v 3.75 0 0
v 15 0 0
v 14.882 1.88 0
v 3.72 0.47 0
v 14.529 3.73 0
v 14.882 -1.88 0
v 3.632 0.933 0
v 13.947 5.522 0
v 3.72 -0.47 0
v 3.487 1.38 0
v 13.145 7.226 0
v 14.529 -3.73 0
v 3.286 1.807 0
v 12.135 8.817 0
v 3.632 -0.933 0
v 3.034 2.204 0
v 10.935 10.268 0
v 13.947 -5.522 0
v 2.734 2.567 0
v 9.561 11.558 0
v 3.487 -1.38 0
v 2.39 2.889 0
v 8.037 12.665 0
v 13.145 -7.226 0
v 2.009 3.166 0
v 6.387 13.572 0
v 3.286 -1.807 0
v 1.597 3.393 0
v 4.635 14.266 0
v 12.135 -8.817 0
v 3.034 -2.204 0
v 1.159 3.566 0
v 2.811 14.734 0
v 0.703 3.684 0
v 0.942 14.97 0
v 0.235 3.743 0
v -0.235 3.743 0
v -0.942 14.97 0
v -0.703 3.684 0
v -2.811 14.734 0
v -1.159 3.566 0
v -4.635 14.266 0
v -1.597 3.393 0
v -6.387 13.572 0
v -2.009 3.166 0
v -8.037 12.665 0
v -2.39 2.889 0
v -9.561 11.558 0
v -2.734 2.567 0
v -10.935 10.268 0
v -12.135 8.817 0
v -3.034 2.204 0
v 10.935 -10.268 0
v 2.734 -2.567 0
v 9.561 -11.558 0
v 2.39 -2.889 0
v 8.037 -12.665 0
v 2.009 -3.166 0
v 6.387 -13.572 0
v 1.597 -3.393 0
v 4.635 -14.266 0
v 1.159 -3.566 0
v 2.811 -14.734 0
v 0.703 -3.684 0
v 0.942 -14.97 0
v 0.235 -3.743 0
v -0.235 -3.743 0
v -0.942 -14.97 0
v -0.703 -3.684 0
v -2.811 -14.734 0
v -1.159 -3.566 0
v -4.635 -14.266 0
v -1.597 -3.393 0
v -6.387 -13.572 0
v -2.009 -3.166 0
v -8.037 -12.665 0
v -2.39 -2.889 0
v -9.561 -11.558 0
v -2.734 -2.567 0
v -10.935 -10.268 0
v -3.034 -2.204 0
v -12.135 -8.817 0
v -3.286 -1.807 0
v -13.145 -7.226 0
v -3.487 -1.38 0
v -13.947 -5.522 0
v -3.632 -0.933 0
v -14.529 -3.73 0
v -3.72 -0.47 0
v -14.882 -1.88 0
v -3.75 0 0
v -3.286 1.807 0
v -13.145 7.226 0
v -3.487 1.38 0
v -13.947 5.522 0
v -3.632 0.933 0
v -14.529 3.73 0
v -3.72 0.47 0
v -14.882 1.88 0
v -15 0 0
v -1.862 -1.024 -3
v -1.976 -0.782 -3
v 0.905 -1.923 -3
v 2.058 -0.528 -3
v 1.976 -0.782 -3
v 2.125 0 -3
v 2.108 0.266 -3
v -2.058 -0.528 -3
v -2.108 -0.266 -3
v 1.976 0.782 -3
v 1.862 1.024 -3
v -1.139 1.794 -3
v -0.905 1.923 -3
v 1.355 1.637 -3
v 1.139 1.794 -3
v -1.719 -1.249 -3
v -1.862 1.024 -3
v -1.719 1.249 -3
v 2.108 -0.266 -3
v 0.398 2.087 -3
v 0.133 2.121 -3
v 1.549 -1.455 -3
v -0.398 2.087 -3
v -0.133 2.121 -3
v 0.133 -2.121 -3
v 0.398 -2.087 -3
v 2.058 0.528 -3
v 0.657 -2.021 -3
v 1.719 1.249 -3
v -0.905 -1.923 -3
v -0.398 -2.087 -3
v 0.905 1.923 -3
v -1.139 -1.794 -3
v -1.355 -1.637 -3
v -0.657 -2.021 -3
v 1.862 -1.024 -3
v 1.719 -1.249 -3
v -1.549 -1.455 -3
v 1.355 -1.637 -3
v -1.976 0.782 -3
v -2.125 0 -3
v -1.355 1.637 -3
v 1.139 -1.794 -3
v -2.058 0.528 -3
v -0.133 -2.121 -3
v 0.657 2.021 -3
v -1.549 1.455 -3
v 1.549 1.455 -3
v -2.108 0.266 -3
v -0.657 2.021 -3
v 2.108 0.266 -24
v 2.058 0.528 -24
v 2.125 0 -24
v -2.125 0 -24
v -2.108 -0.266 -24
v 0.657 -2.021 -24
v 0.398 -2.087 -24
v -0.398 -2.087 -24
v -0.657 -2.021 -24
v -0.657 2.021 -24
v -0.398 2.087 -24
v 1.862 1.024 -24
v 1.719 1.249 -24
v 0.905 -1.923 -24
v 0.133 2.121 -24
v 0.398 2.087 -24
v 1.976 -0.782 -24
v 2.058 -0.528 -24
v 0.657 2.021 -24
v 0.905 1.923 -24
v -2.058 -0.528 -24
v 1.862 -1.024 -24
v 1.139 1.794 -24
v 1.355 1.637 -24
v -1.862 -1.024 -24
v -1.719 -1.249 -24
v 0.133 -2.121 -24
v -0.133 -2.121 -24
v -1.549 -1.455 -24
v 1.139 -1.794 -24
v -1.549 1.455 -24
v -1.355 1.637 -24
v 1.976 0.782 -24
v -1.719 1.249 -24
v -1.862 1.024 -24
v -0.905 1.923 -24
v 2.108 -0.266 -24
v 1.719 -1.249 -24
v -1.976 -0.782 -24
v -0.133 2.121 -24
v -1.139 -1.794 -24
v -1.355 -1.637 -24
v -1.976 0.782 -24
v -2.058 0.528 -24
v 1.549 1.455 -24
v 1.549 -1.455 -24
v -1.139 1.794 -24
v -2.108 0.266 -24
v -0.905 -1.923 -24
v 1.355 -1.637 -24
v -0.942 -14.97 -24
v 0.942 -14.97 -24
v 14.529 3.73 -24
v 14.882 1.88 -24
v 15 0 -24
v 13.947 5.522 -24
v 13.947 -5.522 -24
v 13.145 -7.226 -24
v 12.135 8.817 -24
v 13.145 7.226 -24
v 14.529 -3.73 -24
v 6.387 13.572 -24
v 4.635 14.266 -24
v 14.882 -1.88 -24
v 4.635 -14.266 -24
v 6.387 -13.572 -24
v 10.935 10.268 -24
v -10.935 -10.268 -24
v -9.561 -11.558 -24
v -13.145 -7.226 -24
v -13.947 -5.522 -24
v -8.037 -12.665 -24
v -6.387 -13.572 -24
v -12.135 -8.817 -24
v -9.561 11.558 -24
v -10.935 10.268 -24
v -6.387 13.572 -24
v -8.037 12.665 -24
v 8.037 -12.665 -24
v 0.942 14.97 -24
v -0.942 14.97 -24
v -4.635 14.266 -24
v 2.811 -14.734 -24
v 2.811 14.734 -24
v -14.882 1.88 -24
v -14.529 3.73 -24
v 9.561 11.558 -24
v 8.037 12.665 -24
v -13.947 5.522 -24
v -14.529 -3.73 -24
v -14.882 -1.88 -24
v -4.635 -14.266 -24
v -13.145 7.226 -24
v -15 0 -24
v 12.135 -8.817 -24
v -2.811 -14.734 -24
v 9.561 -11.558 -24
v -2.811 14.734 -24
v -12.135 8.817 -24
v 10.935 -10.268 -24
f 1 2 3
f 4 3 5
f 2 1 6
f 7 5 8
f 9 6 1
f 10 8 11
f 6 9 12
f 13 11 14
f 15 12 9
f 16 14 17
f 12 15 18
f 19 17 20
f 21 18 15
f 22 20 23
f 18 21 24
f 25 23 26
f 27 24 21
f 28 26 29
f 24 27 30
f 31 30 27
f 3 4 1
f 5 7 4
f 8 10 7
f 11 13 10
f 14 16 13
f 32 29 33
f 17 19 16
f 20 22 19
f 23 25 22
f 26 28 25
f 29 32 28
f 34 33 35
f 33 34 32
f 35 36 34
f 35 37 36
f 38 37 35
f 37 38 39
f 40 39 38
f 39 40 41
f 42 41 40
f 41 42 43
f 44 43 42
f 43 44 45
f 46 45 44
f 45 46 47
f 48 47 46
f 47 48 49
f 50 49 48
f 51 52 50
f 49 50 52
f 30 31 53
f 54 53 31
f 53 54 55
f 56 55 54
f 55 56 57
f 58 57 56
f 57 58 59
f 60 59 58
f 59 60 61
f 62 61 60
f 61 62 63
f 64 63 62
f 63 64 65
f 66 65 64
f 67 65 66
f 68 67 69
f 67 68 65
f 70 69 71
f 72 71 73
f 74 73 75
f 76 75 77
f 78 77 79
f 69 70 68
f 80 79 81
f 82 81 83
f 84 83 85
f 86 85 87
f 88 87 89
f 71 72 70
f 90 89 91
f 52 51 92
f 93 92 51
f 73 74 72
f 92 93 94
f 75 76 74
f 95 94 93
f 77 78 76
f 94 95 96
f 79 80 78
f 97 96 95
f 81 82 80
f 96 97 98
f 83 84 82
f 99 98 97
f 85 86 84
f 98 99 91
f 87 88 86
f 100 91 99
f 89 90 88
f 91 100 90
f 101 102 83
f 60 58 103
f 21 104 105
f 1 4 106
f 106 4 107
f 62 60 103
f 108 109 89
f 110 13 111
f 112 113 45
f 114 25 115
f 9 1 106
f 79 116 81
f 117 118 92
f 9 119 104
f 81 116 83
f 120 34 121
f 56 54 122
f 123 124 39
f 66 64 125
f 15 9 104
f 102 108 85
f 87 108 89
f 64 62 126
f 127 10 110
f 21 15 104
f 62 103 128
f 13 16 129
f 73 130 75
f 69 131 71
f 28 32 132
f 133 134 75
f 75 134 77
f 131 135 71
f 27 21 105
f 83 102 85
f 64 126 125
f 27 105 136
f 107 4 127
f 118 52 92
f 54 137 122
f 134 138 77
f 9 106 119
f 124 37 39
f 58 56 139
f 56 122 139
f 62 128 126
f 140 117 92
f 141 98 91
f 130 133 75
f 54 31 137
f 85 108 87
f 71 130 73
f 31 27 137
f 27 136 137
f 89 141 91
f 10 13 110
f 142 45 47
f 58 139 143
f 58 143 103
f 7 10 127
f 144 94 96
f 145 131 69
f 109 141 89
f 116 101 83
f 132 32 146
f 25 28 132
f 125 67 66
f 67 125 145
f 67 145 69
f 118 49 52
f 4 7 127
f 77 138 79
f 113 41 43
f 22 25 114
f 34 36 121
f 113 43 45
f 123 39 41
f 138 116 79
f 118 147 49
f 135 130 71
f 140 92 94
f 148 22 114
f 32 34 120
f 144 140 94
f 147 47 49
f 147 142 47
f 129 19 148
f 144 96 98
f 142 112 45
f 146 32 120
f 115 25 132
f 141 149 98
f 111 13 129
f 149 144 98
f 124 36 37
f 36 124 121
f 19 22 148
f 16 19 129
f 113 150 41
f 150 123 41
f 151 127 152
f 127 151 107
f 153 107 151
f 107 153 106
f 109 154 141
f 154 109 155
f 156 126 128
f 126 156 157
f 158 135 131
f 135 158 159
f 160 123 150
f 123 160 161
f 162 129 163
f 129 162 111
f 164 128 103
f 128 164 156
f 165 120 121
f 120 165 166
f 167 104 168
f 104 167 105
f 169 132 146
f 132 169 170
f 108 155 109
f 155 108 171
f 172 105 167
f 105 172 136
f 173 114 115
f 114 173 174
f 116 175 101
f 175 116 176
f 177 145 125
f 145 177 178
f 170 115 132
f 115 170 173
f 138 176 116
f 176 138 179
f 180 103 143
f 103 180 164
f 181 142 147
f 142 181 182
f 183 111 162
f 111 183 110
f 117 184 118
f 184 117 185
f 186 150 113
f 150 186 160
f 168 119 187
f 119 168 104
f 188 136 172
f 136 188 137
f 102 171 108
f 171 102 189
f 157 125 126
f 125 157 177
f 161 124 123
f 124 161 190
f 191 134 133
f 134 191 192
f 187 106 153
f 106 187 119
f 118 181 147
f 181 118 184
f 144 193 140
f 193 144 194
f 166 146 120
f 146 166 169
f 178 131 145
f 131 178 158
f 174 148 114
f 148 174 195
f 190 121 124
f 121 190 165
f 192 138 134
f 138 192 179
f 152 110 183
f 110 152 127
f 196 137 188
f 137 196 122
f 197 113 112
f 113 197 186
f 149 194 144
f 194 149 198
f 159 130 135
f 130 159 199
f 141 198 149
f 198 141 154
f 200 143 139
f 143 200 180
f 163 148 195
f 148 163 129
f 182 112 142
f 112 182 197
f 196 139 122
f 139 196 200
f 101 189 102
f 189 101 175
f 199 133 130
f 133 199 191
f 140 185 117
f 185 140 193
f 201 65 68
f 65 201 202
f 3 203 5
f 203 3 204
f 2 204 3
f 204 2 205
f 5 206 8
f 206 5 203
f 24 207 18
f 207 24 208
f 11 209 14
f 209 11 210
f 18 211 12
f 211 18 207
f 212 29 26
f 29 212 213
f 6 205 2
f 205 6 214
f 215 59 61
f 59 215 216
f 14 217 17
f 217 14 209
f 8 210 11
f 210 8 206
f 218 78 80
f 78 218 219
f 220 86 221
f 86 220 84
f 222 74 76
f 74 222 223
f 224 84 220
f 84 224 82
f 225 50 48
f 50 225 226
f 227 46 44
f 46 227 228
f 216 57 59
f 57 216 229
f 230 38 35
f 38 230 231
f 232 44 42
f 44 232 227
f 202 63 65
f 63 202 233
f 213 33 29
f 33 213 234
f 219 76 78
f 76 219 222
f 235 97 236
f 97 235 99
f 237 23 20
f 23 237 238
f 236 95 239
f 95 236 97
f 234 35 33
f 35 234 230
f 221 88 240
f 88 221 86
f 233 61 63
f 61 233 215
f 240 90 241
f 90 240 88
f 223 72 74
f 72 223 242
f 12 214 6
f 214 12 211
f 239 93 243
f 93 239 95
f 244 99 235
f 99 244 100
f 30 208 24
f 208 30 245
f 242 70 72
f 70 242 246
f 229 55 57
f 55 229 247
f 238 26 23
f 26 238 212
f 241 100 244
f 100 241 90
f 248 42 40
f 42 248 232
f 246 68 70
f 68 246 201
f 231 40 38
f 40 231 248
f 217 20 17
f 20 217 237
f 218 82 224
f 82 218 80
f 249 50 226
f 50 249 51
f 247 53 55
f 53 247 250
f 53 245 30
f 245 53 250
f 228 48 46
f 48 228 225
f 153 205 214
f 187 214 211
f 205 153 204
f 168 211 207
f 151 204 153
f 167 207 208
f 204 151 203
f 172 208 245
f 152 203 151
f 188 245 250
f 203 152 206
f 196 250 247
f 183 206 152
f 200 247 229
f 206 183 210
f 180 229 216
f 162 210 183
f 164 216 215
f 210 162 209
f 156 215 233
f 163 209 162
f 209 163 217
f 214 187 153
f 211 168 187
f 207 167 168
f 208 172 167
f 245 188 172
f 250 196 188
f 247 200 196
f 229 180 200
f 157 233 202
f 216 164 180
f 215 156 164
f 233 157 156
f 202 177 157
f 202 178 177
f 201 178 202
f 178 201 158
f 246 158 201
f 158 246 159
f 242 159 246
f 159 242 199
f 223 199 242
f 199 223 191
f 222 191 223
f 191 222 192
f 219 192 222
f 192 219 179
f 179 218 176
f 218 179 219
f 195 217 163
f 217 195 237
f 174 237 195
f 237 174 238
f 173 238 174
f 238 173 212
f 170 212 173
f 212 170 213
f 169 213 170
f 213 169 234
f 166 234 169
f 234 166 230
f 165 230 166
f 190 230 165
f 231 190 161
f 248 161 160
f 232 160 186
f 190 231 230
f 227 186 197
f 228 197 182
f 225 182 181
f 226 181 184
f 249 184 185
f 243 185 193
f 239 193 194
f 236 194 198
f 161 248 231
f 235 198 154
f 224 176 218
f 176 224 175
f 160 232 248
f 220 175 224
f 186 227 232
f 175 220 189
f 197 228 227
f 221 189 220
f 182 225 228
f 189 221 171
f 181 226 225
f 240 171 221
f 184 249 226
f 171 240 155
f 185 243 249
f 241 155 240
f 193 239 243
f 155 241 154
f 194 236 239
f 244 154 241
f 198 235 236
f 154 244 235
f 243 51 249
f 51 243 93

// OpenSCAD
$fn = 50;

difference() {
	union() {
		translate(v = [0, 0, -24.0]) {
			cylinder(h = 24, r = 15.0);
		}
	}
	union() {
		translate(v = [0, 0, 0]) {
			rotate(a = [0, 0, 0]) {
				difference() {
					union() {
						translate(v = [0, 0, -27.0]) {
							cylinder(h = 27, r = 2.0);
						}
						translate(v = [0, 0, -3]) {
							cylinder(h = 3, r1 = 2.125, r2 = 3.75);
						}
						translate(v = [0, 0, -27.0]) {
							cylinder(h = 27, r = 2.125);
						}
						translate(v = [0, 0, -27.0]) {
							cylinder(h = 27, r = 2.0);
						}
					}
					union();
				}
			}
		}
	}
}
